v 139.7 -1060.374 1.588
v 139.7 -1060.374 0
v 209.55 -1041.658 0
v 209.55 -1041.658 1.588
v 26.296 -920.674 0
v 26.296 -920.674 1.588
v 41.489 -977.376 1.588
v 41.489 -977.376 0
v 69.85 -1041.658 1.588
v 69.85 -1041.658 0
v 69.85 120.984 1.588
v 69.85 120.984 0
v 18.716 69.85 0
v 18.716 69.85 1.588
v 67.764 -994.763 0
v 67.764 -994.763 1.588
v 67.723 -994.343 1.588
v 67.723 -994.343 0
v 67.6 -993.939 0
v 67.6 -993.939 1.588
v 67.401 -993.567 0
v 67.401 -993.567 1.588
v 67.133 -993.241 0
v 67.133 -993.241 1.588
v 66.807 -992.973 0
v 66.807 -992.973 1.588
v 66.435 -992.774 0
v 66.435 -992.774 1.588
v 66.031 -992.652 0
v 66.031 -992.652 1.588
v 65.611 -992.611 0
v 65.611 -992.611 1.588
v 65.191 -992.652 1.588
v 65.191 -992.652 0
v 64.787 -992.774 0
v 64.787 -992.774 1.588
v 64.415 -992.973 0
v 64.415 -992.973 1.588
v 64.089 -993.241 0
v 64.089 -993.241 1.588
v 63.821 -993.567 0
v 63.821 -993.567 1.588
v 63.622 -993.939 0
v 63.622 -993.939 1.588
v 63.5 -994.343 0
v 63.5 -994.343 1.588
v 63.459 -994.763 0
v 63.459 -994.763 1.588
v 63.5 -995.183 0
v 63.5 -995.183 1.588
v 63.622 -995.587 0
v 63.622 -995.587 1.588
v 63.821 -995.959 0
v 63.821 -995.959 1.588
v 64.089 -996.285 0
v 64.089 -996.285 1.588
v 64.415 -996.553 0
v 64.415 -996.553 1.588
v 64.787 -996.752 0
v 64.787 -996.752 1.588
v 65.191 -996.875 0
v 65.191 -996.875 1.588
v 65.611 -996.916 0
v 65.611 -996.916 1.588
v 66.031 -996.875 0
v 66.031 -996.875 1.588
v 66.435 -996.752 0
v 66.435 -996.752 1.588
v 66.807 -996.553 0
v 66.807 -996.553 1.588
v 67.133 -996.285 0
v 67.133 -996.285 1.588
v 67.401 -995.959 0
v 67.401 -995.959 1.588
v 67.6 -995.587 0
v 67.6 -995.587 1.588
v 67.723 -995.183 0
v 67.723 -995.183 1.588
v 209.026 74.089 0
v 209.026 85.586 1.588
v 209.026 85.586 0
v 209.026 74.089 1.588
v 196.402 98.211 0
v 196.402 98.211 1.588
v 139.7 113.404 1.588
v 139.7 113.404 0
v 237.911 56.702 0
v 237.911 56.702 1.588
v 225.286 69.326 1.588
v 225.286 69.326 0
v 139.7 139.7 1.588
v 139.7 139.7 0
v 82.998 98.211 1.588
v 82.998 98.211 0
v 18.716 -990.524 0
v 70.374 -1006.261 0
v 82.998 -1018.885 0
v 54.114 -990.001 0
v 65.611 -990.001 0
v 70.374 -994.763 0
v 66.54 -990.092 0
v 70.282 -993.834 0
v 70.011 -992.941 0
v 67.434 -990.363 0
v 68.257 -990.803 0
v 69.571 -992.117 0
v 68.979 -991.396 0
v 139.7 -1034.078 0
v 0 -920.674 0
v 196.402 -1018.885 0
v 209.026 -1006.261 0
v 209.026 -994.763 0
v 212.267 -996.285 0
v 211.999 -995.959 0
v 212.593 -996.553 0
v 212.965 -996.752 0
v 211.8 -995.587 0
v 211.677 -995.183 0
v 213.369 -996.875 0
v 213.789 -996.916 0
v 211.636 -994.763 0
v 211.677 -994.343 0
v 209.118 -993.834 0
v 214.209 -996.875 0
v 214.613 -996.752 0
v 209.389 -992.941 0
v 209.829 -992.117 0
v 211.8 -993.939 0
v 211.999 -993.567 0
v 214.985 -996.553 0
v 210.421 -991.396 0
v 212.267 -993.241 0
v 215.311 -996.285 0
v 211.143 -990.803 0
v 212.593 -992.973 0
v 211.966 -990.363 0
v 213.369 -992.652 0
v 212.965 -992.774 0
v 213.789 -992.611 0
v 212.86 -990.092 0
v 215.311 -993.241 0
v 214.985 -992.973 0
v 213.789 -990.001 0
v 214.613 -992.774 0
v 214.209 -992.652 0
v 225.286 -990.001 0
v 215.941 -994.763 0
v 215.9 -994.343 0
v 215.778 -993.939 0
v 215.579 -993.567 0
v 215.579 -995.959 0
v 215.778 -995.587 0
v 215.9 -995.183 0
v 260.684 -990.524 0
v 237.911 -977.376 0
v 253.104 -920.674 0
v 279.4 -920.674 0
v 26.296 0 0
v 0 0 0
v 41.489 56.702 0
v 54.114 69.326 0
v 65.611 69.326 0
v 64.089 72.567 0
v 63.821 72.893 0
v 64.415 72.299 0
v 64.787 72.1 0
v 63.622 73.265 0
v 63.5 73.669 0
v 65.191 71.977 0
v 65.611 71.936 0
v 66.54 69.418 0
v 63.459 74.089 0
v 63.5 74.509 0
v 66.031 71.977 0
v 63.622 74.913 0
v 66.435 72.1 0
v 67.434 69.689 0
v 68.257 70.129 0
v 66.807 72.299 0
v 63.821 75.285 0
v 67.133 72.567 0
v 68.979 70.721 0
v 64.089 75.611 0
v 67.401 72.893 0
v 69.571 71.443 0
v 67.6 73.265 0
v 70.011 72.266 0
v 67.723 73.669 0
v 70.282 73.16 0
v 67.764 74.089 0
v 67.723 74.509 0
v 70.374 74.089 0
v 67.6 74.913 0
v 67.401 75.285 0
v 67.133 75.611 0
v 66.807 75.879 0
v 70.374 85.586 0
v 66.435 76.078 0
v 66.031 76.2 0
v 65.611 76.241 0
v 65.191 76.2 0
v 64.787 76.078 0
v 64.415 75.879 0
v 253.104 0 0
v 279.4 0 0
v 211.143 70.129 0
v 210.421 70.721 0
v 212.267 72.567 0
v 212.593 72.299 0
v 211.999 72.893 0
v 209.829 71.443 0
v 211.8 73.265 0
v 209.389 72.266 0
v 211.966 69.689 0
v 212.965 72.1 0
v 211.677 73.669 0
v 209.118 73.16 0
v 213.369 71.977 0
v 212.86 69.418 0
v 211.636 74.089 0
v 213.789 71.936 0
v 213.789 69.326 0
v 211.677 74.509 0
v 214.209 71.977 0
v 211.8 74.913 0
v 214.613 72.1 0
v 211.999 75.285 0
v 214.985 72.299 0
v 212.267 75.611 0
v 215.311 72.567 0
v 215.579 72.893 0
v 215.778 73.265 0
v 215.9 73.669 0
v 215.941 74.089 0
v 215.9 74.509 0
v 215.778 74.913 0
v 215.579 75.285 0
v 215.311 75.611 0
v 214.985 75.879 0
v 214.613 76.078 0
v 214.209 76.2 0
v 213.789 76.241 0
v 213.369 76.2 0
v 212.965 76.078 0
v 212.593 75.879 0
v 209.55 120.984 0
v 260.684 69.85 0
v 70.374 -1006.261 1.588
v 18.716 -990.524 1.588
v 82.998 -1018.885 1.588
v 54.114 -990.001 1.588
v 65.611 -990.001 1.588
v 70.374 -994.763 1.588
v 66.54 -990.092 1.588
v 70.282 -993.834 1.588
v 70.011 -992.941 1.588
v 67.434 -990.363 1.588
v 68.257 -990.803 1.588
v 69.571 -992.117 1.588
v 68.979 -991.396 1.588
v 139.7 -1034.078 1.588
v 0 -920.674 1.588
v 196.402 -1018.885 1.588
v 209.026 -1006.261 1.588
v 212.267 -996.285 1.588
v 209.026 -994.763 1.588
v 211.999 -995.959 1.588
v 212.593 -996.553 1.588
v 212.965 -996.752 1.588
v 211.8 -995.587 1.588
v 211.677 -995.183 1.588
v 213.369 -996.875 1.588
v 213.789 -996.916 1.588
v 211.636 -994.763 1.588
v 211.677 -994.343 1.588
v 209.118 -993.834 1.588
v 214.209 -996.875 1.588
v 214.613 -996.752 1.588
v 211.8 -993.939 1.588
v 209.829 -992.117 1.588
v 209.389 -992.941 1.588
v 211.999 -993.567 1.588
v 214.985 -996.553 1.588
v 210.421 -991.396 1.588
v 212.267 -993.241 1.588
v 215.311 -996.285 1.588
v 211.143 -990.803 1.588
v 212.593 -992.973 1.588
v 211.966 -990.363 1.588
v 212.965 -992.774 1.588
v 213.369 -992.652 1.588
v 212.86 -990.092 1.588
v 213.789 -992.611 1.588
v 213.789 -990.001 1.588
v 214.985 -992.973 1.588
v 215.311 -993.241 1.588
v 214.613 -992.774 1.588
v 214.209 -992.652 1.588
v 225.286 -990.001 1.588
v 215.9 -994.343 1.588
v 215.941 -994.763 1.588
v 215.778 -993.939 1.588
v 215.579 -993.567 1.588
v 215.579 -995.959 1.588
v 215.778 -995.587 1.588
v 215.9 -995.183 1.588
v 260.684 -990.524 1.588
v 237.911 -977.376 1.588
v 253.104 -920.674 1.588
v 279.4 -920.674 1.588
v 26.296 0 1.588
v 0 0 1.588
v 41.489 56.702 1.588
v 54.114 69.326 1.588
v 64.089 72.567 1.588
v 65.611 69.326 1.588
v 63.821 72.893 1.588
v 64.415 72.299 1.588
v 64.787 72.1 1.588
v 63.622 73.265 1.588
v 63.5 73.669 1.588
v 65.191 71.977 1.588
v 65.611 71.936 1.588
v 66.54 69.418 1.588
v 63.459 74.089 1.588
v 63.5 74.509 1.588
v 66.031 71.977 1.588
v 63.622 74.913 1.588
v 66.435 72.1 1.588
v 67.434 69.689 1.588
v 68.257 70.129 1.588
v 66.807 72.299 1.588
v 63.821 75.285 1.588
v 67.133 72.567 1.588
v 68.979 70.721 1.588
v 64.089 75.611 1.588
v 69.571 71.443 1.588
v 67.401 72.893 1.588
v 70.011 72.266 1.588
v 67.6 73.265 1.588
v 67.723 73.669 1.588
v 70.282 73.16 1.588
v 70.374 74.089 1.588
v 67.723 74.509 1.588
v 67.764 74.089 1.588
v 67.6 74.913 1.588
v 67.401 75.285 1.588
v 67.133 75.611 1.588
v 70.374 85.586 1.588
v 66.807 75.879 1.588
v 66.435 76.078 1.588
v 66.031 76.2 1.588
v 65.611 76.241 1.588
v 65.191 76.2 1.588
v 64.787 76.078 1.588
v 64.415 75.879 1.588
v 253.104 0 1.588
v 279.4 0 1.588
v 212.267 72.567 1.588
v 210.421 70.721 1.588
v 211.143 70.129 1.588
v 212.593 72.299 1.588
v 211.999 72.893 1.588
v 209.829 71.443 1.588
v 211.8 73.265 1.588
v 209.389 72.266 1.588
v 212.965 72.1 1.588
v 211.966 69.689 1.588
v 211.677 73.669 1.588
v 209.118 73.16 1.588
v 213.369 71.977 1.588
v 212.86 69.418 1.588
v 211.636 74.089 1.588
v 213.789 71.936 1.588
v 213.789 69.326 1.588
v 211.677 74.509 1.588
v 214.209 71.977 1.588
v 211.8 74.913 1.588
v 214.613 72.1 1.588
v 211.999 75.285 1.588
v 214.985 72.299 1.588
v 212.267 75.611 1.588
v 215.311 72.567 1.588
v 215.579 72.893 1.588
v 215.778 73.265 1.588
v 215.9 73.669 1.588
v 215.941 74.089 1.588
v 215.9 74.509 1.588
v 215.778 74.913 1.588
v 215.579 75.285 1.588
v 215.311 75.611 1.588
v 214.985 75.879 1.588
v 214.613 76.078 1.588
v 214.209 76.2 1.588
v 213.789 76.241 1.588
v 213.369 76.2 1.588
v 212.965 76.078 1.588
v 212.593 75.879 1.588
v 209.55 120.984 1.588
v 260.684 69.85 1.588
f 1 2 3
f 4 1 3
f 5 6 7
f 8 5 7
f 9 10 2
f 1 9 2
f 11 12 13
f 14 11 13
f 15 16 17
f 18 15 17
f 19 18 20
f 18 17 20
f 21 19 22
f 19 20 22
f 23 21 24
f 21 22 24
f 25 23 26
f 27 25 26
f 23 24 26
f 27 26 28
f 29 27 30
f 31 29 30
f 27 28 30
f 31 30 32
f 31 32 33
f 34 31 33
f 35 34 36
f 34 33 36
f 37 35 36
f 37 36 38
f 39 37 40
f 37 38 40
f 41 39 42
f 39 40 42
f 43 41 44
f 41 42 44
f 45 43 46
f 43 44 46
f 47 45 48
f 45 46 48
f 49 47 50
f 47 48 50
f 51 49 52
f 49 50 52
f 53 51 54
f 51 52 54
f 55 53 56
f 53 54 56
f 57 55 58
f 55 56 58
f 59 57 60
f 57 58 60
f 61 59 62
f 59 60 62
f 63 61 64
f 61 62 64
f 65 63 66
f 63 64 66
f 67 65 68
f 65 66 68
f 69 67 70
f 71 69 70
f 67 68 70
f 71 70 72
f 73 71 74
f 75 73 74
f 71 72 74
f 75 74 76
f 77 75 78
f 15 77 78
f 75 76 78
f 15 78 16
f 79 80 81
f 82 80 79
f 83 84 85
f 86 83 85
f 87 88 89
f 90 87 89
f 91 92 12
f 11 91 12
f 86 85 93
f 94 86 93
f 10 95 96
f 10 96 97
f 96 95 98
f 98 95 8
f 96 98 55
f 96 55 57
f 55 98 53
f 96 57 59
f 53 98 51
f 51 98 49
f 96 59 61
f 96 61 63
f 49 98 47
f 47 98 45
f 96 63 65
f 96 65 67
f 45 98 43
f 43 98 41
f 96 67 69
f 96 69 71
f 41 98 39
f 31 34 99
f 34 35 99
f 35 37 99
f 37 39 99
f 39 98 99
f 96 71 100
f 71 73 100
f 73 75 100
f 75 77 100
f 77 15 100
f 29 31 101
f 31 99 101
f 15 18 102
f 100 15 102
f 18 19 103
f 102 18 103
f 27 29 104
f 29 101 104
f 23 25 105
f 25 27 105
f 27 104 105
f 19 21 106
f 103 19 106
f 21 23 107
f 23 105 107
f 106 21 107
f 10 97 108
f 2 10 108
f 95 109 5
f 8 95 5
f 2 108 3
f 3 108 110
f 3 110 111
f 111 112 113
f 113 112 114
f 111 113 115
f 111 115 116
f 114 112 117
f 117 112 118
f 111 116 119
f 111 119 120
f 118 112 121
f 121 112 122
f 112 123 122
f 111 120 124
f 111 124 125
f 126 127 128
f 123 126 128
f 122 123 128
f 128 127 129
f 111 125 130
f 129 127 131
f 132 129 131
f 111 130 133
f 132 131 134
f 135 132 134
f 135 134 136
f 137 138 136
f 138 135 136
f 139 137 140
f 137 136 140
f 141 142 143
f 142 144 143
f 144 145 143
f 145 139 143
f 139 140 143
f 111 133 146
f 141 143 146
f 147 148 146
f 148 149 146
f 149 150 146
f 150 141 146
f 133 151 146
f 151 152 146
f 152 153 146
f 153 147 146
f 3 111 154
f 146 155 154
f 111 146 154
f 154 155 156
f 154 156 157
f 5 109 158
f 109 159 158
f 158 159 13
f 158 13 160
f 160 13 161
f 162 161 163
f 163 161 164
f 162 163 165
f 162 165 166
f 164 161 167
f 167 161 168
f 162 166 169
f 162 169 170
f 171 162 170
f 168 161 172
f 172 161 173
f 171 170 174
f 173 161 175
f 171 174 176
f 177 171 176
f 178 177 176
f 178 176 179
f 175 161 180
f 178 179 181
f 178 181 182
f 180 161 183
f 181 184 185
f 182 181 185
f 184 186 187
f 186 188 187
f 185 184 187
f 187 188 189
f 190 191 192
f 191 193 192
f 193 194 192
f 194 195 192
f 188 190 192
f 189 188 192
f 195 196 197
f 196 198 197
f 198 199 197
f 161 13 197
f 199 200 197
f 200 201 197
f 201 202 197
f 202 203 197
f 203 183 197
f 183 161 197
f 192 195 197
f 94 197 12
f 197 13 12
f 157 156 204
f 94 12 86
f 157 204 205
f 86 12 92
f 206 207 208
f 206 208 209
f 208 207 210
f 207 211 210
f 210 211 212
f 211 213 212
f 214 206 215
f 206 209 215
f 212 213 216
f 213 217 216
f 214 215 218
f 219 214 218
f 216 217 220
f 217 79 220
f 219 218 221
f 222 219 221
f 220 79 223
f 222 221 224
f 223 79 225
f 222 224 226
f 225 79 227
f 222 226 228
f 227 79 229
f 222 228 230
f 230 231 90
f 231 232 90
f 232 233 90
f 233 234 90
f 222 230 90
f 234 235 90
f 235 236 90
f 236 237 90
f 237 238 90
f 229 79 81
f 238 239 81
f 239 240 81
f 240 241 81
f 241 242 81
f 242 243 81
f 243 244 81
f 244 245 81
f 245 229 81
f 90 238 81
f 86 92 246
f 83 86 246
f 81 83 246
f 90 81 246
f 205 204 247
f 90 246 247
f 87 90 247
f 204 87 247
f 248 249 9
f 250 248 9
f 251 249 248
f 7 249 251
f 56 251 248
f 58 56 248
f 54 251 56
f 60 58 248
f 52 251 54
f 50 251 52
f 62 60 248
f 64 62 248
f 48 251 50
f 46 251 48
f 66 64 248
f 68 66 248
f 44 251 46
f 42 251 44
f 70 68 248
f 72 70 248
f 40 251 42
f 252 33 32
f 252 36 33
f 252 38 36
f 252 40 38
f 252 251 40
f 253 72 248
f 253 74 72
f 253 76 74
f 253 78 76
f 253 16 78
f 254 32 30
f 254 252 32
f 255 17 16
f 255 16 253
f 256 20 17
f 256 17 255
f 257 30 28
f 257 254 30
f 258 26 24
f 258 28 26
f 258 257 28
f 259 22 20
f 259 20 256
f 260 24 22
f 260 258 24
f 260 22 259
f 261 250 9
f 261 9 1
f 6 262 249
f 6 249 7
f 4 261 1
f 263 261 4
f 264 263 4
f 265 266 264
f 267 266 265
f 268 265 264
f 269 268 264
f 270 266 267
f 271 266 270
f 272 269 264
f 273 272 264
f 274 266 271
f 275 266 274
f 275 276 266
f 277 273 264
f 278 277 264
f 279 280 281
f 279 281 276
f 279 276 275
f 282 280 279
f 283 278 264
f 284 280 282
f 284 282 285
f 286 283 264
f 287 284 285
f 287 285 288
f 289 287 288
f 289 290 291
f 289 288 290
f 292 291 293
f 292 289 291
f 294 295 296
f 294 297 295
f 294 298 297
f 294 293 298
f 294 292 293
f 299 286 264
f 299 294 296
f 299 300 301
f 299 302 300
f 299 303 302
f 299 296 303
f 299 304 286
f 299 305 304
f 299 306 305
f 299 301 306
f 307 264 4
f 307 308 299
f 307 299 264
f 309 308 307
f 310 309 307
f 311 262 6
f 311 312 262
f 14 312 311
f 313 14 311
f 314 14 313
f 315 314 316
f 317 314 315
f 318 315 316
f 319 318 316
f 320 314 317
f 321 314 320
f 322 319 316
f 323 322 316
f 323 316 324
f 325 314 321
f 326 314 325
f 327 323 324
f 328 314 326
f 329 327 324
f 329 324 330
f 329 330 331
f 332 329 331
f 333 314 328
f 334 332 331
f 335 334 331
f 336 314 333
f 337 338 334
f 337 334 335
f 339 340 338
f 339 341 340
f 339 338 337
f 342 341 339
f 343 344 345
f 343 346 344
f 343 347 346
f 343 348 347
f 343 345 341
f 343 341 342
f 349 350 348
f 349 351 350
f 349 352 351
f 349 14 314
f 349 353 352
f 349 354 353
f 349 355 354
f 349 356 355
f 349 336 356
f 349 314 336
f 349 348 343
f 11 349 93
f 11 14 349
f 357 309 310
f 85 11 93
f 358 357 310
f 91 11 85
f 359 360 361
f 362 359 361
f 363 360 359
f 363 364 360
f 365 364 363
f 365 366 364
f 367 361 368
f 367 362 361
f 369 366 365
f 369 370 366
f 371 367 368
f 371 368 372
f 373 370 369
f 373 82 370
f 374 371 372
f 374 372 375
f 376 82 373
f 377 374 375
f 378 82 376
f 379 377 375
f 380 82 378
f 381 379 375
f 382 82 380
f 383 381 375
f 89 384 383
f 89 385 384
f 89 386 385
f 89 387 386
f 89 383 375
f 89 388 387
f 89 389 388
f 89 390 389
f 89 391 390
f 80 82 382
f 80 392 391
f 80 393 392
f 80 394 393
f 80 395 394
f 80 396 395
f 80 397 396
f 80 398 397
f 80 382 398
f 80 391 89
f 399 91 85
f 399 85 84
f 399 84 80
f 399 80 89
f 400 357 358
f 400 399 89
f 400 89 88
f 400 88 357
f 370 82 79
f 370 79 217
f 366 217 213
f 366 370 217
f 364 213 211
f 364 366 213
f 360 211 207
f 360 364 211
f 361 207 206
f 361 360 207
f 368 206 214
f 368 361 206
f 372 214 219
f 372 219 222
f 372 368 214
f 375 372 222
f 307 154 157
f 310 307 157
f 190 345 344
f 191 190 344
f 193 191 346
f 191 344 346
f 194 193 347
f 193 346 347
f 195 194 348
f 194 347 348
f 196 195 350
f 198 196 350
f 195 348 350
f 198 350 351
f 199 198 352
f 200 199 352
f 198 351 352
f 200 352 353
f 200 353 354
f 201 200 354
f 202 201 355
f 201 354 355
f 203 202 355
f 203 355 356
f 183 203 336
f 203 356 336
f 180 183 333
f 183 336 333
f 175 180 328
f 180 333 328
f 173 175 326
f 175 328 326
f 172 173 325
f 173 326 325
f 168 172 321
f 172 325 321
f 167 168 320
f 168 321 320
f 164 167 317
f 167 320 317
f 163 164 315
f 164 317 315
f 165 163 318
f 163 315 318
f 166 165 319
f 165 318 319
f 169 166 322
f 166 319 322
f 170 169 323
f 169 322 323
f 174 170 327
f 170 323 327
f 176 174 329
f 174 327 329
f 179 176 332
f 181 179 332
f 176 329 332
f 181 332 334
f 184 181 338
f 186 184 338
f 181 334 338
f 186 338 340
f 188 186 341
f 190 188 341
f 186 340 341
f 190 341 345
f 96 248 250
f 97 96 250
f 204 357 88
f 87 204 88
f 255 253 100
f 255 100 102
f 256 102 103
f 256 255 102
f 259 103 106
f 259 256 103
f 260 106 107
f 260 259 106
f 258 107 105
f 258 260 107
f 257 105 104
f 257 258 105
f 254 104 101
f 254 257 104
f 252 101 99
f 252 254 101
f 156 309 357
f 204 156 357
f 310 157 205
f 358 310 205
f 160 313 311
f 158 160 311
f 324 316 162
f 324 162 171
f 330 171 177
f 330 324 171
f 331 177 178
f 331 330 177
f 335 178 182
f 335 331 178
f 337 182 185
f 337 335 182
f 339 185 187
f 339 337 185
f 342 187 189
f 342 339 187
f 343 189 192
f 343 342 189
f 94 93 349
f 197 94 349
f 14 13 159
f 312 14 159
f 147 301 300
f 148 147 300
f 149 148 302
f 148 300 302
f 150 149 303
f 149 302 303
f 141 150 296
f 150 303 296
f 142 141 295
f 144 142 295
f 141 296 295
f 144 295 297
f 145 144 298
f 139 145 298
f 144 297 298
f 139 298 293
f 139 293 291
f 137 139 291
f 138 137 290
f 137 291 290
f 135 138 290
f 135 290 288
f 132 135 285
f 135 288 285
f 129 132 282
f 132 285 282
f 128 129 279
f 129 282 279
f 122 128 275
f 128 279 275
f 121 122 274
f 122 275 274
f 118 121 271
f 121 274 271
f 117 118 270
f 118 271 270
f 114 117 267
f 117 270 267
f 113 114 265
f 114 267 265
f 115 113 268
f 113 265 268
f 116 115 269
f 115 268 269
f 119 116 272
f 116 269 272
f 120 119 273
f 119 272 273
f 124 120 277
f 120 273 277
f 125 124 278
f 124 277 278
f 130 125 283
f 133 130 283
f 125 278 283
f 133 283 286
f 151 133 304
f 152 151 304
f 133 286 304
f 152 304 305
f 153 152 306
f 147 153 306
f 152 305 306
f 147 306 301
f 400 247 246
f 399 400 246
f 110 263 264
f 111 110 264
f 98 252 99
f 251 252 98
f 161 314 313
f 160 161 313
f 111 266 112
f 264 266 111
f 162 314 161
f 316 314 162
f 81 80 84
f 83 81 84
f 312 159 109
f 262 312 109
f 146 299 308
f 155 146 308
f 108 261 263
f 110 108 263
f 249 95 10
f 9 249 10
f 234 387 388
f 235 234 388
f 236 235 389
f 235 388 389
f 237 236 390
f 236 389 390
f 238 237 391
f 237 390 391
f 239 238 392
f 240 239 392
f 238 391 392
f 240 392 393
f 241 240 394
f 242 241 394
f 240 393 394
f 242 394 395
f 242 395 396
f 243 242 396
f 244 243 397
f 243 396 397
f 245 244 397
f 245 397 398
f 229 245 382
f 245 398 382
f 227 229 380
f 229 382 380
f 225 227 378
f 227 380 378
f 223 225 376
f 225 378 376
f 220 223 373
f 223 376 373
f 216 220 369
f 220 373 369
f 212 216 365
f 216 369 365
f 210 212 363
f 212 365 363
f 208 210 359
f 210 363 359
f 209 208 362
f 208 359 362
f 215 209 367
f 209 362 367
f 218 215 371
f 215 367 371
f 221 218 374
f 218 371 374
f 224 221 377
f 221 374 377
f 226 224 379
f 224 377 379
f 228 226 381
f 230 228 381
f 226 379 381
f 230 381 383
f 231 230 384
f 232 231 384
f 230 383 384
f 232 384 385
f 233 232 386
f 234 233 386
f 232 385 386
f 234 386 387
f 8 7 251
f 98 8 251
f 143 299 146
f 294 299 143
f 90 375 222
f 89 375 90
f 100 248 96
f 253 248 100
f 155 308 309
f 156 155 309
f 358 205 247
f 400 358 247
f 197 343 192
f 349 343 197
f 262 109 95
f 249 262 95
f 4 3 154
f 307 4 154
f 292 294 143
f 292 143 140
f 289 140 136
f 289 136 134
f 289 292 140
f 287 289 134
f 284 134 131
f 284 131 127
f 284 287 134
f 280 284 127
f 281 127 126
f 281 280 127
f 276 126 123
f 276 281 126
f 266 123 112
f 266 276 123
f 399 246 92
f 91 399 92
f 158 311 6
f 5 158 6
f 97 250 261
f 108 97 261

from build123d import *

# Parameters (mm, degrees)
F1_DEPTH = 1.5875
F3_DEPTH = 1.5875
F4_R     = 2.15265
F5_DEPTH = 1.5875


with BuildPart() as f1:
    # F0 (on Top) → F1 (new body)
    with BuildSketch(Plane.XY):
        Polygon((279.4, -920.6744858), (279.4, 0), (260.6837489087, 69.85), (209.55, 120.9837489087), (139.7, 139.7), (69.85, 120.9837489087), (18.7162510913, 69.85), (0, 0), (0, -920.6744858), (18.7162510913, -990.5244858), (69.85, -1041.6582347087), (139.7, -1060.3744858), (209.55, -1041.6582347087), (260.6837489087, -990.5244858), align=None)
    extrude(amount=F1_DEPTH)

    # F2 (on face) → F3 (cut, through all)
    with BuildSketch(Plane.XY.offset(1.5875)):
        Polygon((253.1039850176, -920.6744858), (253.1039850176, 0), (237.9107319156, 56.7019925088), (196.4019925088, 98.2107319156), (139.7, 113.4039850176), (82.9980074912, 98.2107319156), (41.4892680844, 56.7019925088), (26.2960149824, 0), (26.2960149824, -920.6744858), (41.4892680844, -977.3764783088), (82.9980074912, -1018.8852177156), (139.7, -1034.0784708176), (196.4019925088, -1018.8852177156), (237.9107319156, -977.3764783088), align=None)
    extrude(amount=-F3_DEPTH, mode=Mode.SUBTRACT)

    # F4 (on face) → F5 (join, through all)
    with BuildSketch(Plane.XY.offset(1.5875)):
        with BuildLine():
            Line((225.2864582576, 69.3262661668), (209.0262661668, 85.5864582576))
            Line((209.0262661668, 85.5864582576), (209.0262661668, 74.0887661668))
            ThreePointArc((209.0262661668, 74.0887661668), (210.4211701214, 70.7211701214), (213.7887661668, 69.3262661668))
            Line((213.7887661668, 69.3262661668), (225.2864582576, 69.3262661668))
        make_face()
        with Locations((213.7887661668, 74.0887661668)):
            Circle(F4_R, mode=Mode.SUBTRACT)
        with BuildLine():
            ThreePointArc((65.6112338332, 69.3262661668), (68.9788298786, 70.7211701214), (70.3737338332, 74.0887661668))
            Line((70.3737338332, 74.0887661668), (70.3737338332, 85.5864582576))
            Line((70.3737338332, 85.5864582576), (54.1135417424, 69.3262661668))
            Line((54.1135417424, 69.3262661668), (65.6112338332, 69.3262661668))
        make_face()
        with Locations((65.6112338332, 74.0887661668)):
            Circle(F4_R, mode=Mode.SUBTRACT)
        with BuildLine():
            Line((65.6112338332, -990.0007519668), (54.1135417424, -990.0007519668))
            Line((54.1135417424, -990.0007519668), (70.3737338332, -1006.2609440576))
            Line((70.3737338332, -1006.2609440576), (70.3737338332, -994.7632519668))
            ThreePointArc((70.3737338332, -994.7632519668), (68.9788298786, -991.3956559214), (65.6112338332, -990.0007519668))
        make_face()
        with Locations((65.6112338332, -994.7632519668)):
            Circle(F4_R, mode=Mode.SUBTRACT)
        with BuildLine():
            Line((209.0262661668, -1006.2609440576), (225.2864582576, -990.0007519668))
            Line((225.2864582576, -990.0007519668), (213.7887661668, -990.0007519668))
            ThreePointArc((213.7887661668, -990.0007519668), (210.4211701214, -991.3956559214), (209.0262661668, -994.7632519668))
            Line((209.0262661668, -994.7632519668), (209.0262661668, -1006.2609440576))
        make_face()
        with Locations((213.7887661668, -994.7632519668)):
            Circle(F4_R, mode=Mode.SUBTRACT)
    extrude(amount=-F5_DEPTH)


solid = f1.part
